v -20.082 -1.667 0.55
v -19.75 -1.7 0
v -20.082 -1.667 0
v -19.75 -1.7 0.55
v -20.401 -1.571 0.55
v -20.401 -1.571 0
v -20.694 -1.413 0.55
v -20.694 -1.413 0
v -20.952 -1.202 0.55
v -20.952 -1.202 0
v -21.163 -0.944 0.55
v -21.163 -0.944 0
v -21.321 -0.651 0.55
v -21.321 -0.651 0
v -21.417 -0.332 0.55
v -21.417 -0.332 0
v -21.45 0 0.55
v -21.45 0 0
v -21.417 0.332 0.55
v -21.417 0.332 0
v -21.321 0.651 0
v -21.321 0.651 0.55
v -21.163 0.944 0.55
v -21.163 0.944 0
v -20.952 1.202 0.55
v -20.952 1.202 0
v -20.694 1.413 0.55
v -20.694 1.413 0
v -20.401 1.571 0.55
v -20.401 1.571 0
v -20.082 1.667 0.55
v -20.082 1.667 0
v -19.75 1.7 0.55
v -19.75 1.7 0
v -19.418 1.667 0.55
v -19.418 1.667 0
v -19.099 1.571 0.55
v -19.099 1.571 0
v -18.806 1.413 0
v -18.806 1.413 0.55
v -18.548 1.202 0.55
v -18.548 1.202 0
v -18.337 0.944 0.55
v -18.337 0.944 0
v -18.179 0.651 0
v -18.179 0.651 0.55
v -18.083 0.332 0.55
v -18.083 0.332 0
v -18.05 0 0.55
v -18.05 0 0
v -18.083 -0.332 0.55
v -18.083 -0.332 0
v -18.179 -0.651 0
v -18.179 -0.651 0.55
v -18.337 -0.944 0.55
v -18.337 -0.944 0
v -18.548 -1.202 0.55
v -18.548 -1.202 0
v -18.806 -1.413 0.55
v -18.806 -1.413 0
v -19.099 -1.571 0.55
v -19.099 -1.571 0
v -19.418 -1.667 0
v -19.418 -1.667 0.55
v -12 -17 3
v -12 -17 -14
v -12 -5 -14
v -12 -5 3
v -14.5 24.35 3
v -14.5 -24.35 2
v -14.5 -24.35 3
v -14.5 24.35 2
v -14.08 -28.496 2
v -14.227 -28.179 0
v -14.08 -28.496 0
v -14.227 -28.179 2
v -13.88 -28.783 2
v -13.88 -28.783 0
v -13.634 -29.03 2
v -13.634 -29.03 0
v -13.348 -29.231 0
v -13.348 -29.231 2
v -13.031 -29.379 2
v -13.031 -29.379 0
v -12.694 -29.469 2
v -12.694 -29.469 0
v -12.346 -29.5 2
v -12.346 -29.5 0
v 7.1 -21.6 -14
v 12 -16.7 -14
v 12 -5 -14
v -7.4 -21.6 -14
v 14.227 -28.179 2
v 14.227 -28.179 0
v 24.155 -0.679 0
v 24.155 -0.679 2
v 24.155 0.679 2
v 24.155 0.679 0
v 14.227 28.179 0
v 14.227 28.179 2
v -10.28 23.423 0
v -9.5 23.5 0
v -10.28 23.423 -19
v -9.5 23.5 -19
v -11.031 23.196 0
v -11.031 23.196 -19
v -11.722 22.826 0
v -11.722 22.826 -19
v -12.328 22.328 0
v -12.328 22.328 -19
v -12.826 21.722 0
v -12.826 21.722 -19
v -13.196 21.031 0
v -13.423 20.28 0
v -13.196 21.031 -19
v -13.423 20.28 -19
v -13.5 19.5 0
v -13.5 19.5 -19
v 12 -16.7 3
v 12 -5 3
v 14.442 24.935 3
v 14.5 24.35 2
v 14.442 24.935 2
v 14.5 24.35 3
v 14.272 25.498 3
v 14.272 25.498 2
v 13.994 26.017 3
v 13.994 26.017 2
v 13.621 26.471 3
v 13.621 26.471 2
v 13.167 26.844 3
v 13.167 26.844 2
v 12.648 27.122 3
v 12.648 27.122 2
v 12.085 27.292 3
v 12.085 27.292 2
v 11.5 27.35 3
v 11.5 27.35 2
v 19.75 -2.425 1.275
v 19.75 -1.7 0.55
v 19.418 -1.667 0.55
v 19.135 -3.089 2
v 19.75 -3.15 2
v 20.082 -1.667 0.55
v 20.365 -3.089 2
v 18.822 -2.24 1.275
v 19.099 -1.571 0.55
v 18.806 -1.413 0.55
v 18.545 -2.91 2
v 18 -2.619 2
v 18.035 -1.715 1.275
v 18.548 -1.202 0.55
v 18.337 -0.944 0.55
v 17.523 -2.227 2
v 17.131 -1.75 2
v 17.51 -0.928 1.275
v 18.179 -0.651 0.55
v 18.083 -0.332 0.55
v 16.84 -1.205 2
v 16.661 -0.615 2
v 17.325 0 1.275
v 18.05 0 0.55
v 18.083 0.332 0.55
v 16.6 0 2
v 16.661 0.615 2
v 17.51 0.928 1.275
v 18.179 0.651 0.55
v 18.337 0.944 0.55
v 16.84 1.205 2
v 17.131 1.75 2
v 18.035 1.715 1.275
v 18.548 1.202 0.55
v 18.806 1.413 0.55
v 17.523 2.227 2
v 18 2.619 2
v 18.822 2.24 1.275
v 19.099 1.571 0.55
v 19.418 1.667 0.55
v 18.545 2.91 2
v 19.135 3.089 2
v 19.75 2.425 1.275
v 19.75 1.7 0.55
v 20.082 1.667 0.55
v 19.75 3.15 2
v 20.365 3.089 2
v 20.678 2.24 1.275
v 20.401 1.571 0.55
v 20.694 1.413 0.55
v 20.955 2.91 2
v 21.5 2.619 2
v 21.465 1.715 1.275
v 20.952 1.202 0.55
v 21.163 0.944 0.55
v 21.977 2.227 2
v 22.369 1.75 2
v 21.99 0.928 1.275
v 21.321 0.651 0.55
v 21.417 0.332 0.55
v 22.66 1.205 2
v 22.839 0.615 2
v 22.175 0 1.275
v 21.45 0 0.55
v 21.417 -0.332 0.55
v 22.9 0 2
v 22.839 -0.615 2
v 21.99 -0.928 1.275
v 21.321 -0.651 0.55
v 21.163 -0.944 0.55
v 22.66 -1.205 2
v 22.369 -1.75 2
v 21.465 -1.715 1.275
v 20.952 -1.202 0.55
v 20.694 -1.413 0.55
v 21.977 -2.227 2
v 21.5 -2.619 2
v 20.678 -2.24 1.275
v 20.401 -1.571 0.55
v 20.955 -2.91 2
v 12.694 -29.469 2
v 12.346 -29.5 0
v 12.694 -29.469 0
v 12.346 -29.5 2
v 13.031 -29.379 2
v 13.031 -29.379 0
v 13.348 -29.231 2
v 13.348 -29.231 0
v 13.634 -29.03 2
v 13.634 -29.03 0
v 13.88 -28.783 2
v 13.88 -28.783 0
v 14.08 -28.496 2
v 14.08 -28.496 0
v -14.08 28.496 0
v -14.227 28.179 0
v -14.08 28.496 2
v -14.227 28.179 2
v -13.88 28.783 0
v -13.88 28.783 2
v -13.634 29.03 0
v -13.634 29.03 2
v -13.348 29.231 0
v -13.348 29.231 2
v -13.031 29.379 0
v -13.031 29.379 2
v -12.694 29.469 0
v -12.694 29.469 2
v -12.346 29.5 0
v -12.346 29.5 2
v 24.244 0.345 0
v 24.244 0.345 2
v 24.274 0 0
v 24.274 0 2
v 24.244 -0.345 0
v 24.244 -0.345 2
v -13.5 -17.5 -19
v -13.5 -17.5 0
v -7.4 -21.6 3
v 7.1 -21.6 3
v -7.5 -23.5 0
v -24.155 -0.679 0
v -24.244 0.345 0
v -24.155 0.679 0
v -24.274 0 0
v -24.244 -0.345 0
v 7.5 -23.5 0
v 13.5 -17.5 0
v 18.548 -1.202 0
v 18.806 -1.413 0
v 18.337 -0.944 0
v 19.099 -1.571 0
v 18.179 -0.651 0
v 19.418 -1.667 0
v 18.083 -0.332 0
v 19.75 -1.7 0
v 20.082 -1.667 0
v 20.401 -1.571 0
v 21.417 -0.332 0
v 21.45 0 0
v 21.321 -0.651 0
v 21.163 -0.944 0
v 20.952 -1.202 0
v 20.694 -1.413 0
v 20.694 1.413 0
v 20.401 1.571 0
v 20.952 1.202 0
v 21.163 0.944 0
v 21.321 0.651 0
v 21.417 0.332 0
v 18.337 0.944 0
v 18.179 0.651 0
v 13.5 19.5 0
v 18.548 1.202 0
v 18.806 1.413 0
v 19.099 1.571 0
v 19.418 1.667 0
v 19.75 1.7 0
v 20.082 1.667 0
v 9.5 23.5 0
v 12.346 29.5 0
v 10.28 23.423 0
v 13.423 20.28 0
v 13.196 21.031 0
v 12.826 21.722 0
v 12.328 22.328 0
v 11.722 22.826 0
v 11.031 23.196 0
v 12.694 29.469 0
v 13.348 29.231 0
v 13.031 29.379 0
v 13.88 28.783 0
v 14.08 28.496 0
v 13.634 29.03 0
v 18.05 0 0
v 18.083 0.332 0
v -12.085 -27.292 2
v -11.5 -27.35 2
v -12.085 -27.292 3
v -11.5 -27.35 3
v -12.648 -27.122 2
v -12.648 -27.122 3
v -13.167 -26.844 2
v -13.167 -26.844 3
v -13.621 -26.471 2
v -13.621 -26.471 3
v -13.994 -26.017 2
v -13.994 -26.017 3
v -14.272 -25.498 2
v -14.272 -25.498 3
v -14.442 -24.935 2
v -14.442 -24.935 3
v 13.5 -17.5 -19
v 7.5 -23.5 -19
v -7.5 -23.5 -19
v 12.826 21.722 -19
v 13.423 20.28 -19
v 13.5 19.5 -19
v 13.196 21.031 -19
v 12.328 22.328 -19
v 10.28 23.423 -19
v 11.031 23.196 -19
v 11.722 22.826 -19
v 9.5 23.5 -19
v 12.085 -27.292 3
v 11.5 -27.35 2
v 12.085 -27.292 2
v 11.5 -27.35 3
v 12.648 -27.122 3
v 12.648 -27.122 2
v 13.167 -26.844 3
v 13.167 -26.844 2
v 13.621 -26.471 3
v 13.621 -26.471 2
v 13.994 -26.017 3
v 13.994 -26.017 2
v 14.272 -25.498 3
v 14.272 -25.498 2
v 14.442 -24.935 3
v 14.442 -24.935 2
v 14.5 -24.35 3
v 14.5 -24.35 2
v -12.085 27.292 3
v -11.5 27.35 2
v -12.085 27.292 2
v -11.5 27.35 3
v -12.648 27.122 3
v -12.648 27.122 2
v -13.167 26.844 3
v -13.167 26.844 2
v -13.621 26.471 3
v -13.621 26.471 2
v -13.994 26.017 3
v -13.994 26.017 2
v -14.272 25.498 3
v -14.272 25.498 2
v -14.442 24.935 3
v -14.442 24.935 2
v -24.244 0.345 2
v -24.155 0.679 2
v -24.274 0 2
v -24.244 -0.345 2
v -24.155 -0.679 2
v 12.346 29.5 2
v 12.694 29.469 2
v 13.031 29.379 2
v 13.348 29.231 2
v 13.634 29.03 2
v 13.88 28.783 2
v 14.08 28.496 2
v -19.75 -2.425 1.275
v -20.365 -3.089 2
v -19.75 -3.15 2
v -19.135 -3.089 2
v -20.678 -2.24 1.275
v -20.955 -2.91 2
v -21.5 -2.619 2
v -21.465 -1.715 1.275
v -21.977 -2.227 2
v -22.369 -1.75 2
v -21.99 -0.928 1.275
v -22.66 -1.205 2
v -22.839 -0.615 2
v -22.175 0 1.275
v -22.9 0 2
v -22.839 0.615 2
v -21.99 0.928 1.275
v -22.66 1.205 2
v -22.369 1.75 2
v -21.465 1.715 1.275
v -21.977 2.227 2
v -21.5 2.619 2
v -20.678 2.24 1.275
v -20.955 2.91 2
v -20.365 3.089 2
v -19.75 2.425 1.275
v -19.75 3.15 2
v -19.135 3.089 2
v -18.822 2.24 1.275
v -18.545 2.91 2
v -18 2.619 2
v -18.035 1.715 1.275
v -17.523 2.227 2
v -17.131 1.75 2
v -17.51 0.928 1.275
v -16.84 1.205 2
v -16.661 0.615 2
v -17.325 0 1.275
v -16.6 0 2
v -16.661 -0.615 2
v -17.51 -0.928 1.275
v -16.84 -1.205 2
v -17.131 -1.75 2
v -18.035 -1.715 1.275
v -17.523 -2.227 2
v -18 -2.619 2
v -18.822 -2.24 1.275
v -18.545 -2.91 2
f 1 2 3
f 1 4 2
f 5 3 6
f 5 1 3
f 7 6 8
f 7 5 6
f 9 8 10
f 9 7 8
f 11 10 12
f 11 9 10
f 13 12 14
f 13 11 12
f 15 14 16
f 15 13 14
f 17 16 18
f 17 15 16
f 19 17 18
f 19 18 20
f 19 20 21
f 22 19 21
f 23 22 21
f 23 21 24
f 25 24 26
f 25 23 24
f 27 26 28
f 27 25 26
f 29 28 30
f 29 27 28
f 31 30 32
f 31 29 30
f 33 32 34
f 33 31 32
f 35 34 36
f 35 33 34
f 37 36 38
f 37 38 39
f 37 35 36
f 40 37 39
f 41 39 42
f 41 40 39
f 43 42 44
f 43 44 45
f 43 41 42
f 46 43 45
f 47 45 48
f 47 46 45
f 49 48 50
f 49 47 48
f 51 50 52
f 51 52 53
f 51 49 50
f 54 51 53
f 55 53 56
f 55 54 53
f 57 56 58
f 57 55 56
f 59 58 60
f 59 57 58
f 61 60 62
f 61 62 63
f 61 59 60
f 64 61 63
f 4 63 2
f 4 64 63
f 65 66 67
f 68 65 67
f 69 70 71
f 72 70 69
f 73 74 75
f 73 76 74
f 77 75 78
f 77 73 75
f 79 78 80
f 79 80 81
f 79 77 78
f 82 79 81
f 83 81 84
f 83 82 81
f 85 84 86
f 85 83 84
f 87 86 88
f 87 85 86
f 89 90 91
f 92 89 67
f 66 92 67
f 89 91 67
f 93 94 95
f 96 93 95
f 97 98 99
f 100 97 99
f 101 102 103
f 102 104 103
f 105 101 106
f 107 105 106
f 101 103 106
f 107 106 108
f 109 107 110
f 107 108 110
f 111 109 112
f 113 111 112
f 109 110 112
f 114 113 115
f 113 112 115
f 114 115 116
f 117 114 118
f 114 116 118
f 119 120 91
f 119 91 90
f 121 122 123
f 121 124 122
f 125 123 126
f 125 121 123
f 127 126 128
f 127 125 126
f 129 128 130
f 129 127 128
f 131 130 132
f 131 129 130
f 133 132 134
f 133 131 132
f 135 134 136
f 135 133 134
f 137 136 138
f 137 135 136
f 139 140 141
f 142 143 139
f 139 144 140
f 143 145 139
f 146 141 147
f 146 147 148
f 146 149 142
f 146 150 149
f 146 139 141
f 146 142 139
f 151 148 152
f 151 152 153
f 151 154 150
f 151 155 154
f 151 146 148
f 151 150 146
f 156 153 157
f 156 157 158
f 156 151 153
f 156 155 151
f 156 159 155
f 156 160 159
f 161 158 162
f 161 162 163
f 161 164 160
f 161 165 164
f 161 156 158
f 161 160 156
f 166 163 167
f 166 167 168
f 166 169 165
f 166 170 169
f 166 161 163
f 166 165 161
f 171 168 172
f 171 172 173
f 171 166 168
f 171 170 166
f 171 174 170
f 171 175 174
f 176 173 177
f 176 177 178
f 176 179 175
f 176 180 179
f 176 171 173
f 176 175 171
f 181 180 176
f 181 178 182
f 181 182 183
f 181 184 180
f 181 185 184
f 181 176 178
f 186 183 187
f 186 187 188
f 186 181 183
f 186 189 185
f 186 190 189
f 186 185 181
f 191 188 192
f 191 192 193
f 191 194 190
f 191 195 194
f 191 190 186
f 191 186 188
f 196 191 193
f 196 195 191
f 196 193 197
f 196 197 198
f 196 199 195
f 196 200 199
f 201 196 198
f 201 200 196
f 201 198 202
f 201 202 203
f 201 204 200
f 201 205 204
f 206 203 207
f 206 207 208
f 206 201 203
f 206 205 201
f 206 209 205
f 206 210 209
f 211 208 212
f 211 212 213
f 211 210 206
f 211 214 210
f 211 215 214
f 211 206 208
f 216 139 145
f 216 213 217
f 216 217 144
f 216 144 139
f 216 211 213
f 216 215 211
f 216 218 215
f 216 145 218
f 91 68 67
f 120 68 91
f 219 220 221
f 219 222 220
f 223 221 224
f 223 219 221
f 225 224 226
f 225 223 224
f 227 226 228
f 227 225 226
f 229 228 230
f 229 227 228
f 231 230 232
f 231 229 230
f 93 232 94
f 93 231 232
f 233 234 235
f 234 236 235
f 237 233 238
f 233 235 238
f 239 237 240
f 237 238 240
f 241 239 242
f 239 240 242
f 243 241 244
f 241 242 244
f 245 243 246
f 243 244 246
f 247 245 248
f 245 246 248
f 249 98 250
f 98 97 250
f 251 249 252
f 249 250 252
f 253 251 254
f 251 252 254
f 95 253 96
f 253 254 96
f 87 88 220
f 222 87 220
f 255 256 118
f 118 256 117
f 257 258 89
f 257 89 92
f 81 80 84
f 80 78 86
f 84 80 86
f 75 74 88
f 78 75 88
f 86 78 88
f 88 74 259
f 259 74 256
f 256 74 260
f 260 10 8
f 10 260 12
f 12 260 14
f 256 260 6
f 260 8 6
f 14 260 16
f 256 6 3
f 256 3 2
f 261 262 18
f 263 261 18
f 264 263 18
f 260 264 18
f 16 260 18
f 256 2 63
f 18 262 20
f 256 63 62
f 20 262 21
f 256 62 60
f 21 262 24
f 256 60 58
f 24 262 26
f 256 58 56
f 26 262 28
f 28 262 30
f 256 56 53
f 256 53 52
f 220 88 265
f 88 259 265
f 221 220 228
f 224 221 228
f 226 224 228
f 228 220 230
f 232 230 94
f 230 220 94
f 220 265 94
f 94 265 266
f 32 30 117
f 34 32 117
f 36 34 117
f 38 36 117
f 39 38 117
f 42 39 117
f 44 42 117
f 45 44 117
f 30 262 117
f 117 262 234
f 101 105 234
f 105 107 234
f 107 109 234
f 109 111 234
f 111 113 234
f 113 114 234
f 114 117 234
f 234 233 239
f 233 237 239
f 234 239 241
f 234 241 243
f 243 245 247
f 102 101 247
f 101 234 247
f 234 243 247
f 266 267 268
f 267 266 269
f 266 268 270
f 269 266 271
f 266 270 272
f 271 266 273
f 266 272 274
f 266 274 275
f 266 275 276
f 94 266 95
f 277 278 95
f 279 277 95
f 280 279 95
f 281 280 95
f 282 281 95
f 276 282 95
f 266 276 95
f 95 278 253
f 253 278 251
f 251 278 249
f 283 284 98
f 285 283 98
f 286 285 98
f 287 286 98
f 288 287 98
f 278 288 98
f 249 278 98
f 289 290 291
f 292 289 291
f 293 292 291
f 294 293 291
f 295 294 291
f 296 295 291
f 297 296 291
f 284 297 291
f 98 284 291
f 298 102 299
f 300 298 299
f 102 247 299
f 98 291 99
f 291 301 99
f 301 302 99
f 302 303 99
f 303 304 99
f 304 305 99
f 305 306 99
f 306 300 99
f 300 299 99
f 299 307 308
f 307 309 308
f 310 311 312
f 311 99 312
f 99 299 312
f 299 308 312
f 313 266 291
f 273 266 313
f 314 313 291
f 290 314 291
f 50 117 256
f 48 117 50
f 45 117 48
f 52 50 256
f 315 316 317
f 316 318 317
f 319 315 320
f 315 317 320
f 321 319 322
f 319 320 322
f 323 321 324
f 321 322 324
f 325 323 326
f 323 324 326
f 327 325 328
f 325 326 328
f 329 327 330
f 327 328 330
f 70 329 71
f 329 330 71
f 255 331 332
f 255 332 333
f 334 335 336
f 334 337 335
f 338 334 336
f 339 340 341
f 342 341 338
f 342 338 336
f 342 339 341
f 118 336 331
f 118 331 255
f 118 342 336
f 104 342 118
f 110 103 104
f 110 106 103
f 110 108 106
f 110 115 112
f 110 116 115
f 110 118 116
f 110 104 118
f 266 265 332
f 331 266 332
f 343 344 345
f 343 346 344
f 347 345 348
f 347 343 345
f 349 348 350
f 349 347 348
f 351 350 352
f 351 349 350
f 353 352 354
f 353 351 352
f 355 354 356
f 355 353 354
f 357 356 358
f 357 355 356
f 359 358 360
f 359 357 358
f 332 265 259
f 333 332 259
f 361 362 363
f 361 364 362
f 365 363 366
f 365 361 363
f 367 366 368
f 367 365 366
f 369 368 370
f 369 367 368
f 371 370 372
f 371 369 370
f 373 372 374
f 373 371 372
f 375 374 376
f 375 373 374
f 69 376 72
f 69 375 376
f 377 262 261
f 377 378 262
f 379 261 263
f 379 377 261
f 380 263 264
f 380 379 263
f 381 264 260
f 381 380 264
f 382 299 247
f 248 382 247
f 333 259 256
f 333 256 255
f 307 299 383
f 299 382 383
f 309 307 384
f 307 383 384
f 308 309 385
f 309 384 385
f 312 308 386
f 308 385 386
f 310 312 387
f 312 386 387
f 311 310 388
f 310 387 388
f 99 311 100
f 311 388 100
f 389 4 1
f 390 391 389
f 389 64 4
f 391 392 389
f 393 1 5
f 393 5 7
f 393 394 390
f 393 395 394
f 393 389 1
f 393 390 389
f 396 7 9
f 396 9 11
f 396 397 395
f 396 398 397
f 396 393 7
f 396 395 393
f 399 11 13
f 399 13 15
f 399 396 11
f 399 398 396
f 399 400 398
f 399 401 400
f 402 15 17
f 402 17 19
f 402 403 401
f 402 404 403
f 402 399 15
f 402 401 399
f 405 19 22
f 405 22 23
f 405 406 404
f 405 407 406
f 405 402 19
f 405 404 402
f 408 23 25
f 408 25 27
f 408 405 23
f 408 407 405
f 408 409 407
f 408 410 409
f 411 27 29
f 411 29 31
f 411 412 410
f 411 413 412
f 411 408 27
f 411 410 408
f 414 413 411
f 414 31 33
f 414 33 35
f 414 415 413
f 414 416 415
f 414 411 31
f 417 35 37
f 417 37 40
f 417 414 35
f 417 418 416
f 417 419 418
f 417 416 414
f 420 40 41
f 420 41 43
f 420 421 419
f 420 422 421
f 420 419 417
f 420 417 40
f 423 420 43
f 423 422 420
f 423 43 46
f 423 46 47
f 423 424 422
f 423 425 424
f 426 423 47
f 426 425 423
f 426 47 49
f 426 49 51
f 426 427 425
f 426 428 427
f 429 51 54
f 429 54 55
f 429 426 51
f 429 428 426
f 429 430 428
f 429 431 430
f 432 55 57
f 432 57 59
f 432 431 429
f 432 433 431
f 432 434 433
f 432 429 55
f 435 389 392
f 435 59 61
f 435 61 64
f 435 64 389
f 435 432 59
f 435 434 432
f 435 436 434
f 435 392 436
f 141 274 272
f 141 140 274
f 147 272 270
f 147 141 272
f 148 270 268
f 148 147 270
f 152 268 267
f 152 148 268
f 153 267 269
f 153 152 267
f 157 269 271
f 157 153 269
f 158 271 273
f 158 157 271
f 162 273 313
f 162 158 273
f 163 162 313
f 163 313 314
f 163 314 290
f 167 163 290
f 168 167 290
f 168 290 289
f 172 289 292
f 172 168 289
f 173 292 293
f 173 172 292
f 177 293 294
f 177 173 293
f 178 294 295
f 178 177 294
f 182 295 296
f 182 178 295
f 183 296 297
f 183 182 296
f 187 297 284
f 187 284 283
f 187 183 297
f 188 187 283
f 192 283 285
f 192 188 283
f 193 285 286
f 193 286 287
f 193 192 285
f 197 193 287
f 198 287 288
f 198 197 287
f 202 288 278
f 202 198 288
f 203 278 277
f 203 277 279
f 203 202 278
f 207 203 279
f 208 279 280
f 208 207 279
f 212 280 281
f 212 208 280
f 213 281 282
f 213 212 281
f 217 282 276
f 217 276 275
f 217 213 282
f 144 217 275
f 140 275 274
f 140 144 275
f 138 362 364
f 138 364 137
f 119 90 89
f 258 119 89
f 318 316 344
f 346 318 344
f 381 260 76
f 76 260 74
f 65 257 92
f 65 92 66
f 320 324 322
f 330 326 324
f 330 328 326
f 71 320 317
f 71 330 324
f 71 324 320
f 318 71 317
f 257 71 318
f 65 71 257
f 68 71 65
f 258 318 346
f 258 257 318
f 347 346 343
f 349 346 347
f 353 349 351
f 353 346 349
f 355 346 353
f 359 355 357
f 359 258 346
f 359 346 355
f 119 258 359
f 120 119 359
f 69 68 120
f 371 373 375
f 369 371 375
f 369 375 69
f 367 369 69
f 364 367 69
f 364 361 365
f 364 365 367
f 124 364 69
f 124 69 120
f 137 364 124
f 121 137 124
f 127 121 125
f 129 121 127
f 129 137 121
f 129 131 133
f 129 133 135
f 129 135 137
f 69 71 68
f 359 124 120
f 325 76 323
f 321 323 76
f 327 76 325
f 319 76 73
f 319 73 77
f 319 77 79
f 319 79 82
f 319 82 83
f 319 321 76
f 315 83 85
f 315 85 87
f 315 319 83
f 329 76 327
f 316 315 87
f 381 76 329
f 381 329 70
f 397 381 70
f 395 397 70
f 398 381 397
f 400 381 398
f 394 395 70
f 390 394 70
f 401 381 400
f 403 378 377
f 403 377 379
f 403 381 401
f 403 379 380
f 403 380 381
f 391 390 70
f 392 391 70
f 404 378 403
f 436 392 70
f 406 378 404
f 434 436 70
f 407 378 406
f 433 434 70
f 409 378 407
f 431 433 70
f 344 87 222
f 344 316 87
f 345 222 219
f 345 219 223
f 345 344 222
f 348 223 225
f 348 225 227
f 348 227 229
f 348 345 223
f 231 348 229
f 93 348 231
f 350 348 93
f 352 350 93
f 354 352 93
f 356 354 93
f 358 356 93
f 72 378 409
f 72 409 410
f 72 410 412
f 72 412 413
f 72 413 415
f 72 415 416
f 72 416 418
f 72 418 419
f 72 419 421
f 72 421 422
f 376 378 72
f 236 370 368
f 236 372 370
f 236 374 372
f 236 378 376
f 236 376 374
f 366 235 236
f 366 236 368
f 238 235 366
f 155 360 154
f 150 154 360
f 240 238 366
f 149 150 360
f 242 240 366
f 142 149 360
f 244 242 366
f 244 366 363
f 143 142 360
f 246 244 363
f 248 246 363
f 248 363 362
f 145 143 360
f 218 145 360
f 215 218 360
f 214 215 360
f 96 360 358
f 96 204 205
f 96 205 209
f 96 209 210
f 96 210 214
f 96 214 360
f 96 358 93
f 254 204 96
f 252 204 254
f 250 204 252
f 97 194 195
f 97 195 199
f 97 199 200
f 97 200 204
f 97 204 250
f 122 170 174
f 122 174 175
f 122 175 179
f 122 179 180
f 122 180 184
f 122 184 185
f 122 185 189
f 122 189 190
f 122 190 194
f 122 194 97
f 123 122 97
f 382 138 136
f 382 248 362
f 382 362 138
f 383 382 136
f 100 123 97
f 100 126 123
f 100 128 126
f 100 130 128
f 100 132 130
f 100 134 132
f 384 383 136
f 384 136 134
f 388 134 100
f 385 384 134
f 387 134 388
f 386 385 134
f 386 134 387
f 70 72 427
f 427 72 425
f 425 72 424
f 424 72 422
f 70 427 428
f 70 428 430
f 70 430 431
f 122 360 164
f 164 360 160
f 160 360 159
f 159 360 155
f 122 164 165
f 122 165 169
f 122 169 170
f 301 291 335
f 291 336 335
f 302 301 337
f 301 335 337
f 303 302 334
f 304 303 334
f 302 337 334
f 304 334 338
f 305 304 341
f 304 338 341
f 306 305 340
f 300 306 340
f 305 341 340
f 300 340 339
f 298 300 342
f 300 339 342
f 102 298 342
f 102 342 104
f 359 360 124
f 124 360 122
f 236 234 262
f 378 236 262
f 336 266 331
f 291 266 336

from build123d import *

# Parameters (mm, degrees)
BOSS_EXTRUDE1_DEPTH                            = 2
SKETCH2_W                                      = 29
SKETCH2_H                                      = 54.7
BOSS_EXTRUDE2_DEPTH                            = 1
FILLET1_R                                      = 3
FILLET2_R                                      = 2
CSK_FOR_M3_FLAT_HEAD_MACHINE_SCREW1_AT_2_COUNT = 2
CSK_FOR_M3_FLAT_HEAD_MACHINE_SCREW1_AT_2_PITCH = 39.5
SKETCH5_W                                      = 27
SKETCH5_H                                      = 47
BOSS_EXTRUDE3_DEPTH                            = 19
CHAMFER1_SIZE                                  = 6
FILLET3_R                                      = 4
CUT_EXTRUDE1_DEPTH                             = 17


with BuildPart() as part:
    # Sketch1 → Boss-Extrude1 (new body)
    with BuildSketch(Plane.XY):
        Polygon((-13.75, 29.5), (-24.4, 0), (-13.75, -29.5), (13.75, -29.5), (24.4, 0), (13.75, 29.5), align=None)
    extrude(amount=BOSS_EXTRUDE1_DEPTH)

    # Sketch2 → Boss-Extrude2 (add)
    with BuildSketch(Plane.XY.offset(2)):
        Rectangle(SKETCH2_W, SKETCH2_H)
    extrude(amount=BOSS_EXTRUDE2_DEPTH)

    # Fillet1
    fillet1_edges = [part.edges().sort_by_distance(p)[0] for p in [
        (14.5, -27.35, 2.5),
        (14.5, 27.35, 2.5),
        (-14.5, 27.35, 2.5),
        (-14.5, -27.35, 2.5),
    ]]
    fillet(fillet1_edges, radius=FILLET1_R)

    # Fillet2
    fillet2_edges = [part.edges().sort_by_distance(p)[0] for p in [
        (24.4, 0, 1),
        (13.75, -29.5, 1),
        (-13.75, -29.5, 1),
        (-24.4, 0, 1),
        (-13.75, 29.5, 1),
        (13.75, 29.5, 1),
    ]]
    fillet(fillet2_edges, radius=FILLET2_R)

    # Sketch3 → CSK for M3 Flat Head Machine Screw1 (revolve, cut)
    with BuildSketch(Plane(origin=(-19.75, 0, 2), x_dir=(0, -1, 0), z_dir=(1, 0, 0))):
        Polygon((0, 0), (0, 2), (1.7, 2), (1.7, 1.45), (3.15, 0), align=None)
    csk_for_m3_flat_head_machine_screw1 = revolve(axis=Axis((-19.75, 0, 8.35), (0, 0, -1)), mode=Mode.SUBTRACT)

    # CSK for M3 Flat Head Machine Screw1 at 2: CSK for M3 Flat Head Machine Screw1 ×2
    with Locations(*[(i * CSK_FOR_M3_FLAT_HEAD_MACHINE_SCREW1_AT_2_PITCH, 0, 0) for i in range(1, CSK_FOR_M3_FLAT_HEAD_MACHINE_SCREW1_AT_2_COUNT)]):
        add(csk_for_m3_flat_head_machine_screw1, mode=Mode.SUBTRACT)

    # Sketch5 → Boss-Extrude3 (add)
    with BuildSketch(Plane(origin=(0, 0, 0), x_dir=(-1, 0, 0), z_dir=(0, 0, -1))):
        Rectangle(SKETCH5_W, SKETCH5_H)
    extrude(amount=BOSS_EXTRUDE3_DEPTH)

    # Chamfer1
    chamfer1_edges = [part.edges().sort_by_distance(p)[0] for p in [
        (-13.5, -23.5, -9.5),
        (13.5, -23.5, -9.5),
    ]]
    chamfer(chamfer1_edges, length=CHAMFER1_SIZE)

    # Fillet3
    fillet3_edges = [part.edges().sort_by_distance(p)[0] for p in [
        (-13.5, 23.5, -9.5),
        (13.5, 23.5, -9.5),
    ]]
    fillet(fillet3_edges, radius=FILLET3_R)

    # Sketch6 → Cut-Extrude1 (cut)
    with BuildSketch(Plane.XY.offset(3)):
        Polygon((-12, -5), (12, -5), (12, -16.7), (7.1, -21.6), (-7.4, -21.6), (-12, -17), align=None)
    extrude(amount=-CUT_EXTRUDE1_DEPTH, mode=Mode.SUBTRACT)


solid = part.part
